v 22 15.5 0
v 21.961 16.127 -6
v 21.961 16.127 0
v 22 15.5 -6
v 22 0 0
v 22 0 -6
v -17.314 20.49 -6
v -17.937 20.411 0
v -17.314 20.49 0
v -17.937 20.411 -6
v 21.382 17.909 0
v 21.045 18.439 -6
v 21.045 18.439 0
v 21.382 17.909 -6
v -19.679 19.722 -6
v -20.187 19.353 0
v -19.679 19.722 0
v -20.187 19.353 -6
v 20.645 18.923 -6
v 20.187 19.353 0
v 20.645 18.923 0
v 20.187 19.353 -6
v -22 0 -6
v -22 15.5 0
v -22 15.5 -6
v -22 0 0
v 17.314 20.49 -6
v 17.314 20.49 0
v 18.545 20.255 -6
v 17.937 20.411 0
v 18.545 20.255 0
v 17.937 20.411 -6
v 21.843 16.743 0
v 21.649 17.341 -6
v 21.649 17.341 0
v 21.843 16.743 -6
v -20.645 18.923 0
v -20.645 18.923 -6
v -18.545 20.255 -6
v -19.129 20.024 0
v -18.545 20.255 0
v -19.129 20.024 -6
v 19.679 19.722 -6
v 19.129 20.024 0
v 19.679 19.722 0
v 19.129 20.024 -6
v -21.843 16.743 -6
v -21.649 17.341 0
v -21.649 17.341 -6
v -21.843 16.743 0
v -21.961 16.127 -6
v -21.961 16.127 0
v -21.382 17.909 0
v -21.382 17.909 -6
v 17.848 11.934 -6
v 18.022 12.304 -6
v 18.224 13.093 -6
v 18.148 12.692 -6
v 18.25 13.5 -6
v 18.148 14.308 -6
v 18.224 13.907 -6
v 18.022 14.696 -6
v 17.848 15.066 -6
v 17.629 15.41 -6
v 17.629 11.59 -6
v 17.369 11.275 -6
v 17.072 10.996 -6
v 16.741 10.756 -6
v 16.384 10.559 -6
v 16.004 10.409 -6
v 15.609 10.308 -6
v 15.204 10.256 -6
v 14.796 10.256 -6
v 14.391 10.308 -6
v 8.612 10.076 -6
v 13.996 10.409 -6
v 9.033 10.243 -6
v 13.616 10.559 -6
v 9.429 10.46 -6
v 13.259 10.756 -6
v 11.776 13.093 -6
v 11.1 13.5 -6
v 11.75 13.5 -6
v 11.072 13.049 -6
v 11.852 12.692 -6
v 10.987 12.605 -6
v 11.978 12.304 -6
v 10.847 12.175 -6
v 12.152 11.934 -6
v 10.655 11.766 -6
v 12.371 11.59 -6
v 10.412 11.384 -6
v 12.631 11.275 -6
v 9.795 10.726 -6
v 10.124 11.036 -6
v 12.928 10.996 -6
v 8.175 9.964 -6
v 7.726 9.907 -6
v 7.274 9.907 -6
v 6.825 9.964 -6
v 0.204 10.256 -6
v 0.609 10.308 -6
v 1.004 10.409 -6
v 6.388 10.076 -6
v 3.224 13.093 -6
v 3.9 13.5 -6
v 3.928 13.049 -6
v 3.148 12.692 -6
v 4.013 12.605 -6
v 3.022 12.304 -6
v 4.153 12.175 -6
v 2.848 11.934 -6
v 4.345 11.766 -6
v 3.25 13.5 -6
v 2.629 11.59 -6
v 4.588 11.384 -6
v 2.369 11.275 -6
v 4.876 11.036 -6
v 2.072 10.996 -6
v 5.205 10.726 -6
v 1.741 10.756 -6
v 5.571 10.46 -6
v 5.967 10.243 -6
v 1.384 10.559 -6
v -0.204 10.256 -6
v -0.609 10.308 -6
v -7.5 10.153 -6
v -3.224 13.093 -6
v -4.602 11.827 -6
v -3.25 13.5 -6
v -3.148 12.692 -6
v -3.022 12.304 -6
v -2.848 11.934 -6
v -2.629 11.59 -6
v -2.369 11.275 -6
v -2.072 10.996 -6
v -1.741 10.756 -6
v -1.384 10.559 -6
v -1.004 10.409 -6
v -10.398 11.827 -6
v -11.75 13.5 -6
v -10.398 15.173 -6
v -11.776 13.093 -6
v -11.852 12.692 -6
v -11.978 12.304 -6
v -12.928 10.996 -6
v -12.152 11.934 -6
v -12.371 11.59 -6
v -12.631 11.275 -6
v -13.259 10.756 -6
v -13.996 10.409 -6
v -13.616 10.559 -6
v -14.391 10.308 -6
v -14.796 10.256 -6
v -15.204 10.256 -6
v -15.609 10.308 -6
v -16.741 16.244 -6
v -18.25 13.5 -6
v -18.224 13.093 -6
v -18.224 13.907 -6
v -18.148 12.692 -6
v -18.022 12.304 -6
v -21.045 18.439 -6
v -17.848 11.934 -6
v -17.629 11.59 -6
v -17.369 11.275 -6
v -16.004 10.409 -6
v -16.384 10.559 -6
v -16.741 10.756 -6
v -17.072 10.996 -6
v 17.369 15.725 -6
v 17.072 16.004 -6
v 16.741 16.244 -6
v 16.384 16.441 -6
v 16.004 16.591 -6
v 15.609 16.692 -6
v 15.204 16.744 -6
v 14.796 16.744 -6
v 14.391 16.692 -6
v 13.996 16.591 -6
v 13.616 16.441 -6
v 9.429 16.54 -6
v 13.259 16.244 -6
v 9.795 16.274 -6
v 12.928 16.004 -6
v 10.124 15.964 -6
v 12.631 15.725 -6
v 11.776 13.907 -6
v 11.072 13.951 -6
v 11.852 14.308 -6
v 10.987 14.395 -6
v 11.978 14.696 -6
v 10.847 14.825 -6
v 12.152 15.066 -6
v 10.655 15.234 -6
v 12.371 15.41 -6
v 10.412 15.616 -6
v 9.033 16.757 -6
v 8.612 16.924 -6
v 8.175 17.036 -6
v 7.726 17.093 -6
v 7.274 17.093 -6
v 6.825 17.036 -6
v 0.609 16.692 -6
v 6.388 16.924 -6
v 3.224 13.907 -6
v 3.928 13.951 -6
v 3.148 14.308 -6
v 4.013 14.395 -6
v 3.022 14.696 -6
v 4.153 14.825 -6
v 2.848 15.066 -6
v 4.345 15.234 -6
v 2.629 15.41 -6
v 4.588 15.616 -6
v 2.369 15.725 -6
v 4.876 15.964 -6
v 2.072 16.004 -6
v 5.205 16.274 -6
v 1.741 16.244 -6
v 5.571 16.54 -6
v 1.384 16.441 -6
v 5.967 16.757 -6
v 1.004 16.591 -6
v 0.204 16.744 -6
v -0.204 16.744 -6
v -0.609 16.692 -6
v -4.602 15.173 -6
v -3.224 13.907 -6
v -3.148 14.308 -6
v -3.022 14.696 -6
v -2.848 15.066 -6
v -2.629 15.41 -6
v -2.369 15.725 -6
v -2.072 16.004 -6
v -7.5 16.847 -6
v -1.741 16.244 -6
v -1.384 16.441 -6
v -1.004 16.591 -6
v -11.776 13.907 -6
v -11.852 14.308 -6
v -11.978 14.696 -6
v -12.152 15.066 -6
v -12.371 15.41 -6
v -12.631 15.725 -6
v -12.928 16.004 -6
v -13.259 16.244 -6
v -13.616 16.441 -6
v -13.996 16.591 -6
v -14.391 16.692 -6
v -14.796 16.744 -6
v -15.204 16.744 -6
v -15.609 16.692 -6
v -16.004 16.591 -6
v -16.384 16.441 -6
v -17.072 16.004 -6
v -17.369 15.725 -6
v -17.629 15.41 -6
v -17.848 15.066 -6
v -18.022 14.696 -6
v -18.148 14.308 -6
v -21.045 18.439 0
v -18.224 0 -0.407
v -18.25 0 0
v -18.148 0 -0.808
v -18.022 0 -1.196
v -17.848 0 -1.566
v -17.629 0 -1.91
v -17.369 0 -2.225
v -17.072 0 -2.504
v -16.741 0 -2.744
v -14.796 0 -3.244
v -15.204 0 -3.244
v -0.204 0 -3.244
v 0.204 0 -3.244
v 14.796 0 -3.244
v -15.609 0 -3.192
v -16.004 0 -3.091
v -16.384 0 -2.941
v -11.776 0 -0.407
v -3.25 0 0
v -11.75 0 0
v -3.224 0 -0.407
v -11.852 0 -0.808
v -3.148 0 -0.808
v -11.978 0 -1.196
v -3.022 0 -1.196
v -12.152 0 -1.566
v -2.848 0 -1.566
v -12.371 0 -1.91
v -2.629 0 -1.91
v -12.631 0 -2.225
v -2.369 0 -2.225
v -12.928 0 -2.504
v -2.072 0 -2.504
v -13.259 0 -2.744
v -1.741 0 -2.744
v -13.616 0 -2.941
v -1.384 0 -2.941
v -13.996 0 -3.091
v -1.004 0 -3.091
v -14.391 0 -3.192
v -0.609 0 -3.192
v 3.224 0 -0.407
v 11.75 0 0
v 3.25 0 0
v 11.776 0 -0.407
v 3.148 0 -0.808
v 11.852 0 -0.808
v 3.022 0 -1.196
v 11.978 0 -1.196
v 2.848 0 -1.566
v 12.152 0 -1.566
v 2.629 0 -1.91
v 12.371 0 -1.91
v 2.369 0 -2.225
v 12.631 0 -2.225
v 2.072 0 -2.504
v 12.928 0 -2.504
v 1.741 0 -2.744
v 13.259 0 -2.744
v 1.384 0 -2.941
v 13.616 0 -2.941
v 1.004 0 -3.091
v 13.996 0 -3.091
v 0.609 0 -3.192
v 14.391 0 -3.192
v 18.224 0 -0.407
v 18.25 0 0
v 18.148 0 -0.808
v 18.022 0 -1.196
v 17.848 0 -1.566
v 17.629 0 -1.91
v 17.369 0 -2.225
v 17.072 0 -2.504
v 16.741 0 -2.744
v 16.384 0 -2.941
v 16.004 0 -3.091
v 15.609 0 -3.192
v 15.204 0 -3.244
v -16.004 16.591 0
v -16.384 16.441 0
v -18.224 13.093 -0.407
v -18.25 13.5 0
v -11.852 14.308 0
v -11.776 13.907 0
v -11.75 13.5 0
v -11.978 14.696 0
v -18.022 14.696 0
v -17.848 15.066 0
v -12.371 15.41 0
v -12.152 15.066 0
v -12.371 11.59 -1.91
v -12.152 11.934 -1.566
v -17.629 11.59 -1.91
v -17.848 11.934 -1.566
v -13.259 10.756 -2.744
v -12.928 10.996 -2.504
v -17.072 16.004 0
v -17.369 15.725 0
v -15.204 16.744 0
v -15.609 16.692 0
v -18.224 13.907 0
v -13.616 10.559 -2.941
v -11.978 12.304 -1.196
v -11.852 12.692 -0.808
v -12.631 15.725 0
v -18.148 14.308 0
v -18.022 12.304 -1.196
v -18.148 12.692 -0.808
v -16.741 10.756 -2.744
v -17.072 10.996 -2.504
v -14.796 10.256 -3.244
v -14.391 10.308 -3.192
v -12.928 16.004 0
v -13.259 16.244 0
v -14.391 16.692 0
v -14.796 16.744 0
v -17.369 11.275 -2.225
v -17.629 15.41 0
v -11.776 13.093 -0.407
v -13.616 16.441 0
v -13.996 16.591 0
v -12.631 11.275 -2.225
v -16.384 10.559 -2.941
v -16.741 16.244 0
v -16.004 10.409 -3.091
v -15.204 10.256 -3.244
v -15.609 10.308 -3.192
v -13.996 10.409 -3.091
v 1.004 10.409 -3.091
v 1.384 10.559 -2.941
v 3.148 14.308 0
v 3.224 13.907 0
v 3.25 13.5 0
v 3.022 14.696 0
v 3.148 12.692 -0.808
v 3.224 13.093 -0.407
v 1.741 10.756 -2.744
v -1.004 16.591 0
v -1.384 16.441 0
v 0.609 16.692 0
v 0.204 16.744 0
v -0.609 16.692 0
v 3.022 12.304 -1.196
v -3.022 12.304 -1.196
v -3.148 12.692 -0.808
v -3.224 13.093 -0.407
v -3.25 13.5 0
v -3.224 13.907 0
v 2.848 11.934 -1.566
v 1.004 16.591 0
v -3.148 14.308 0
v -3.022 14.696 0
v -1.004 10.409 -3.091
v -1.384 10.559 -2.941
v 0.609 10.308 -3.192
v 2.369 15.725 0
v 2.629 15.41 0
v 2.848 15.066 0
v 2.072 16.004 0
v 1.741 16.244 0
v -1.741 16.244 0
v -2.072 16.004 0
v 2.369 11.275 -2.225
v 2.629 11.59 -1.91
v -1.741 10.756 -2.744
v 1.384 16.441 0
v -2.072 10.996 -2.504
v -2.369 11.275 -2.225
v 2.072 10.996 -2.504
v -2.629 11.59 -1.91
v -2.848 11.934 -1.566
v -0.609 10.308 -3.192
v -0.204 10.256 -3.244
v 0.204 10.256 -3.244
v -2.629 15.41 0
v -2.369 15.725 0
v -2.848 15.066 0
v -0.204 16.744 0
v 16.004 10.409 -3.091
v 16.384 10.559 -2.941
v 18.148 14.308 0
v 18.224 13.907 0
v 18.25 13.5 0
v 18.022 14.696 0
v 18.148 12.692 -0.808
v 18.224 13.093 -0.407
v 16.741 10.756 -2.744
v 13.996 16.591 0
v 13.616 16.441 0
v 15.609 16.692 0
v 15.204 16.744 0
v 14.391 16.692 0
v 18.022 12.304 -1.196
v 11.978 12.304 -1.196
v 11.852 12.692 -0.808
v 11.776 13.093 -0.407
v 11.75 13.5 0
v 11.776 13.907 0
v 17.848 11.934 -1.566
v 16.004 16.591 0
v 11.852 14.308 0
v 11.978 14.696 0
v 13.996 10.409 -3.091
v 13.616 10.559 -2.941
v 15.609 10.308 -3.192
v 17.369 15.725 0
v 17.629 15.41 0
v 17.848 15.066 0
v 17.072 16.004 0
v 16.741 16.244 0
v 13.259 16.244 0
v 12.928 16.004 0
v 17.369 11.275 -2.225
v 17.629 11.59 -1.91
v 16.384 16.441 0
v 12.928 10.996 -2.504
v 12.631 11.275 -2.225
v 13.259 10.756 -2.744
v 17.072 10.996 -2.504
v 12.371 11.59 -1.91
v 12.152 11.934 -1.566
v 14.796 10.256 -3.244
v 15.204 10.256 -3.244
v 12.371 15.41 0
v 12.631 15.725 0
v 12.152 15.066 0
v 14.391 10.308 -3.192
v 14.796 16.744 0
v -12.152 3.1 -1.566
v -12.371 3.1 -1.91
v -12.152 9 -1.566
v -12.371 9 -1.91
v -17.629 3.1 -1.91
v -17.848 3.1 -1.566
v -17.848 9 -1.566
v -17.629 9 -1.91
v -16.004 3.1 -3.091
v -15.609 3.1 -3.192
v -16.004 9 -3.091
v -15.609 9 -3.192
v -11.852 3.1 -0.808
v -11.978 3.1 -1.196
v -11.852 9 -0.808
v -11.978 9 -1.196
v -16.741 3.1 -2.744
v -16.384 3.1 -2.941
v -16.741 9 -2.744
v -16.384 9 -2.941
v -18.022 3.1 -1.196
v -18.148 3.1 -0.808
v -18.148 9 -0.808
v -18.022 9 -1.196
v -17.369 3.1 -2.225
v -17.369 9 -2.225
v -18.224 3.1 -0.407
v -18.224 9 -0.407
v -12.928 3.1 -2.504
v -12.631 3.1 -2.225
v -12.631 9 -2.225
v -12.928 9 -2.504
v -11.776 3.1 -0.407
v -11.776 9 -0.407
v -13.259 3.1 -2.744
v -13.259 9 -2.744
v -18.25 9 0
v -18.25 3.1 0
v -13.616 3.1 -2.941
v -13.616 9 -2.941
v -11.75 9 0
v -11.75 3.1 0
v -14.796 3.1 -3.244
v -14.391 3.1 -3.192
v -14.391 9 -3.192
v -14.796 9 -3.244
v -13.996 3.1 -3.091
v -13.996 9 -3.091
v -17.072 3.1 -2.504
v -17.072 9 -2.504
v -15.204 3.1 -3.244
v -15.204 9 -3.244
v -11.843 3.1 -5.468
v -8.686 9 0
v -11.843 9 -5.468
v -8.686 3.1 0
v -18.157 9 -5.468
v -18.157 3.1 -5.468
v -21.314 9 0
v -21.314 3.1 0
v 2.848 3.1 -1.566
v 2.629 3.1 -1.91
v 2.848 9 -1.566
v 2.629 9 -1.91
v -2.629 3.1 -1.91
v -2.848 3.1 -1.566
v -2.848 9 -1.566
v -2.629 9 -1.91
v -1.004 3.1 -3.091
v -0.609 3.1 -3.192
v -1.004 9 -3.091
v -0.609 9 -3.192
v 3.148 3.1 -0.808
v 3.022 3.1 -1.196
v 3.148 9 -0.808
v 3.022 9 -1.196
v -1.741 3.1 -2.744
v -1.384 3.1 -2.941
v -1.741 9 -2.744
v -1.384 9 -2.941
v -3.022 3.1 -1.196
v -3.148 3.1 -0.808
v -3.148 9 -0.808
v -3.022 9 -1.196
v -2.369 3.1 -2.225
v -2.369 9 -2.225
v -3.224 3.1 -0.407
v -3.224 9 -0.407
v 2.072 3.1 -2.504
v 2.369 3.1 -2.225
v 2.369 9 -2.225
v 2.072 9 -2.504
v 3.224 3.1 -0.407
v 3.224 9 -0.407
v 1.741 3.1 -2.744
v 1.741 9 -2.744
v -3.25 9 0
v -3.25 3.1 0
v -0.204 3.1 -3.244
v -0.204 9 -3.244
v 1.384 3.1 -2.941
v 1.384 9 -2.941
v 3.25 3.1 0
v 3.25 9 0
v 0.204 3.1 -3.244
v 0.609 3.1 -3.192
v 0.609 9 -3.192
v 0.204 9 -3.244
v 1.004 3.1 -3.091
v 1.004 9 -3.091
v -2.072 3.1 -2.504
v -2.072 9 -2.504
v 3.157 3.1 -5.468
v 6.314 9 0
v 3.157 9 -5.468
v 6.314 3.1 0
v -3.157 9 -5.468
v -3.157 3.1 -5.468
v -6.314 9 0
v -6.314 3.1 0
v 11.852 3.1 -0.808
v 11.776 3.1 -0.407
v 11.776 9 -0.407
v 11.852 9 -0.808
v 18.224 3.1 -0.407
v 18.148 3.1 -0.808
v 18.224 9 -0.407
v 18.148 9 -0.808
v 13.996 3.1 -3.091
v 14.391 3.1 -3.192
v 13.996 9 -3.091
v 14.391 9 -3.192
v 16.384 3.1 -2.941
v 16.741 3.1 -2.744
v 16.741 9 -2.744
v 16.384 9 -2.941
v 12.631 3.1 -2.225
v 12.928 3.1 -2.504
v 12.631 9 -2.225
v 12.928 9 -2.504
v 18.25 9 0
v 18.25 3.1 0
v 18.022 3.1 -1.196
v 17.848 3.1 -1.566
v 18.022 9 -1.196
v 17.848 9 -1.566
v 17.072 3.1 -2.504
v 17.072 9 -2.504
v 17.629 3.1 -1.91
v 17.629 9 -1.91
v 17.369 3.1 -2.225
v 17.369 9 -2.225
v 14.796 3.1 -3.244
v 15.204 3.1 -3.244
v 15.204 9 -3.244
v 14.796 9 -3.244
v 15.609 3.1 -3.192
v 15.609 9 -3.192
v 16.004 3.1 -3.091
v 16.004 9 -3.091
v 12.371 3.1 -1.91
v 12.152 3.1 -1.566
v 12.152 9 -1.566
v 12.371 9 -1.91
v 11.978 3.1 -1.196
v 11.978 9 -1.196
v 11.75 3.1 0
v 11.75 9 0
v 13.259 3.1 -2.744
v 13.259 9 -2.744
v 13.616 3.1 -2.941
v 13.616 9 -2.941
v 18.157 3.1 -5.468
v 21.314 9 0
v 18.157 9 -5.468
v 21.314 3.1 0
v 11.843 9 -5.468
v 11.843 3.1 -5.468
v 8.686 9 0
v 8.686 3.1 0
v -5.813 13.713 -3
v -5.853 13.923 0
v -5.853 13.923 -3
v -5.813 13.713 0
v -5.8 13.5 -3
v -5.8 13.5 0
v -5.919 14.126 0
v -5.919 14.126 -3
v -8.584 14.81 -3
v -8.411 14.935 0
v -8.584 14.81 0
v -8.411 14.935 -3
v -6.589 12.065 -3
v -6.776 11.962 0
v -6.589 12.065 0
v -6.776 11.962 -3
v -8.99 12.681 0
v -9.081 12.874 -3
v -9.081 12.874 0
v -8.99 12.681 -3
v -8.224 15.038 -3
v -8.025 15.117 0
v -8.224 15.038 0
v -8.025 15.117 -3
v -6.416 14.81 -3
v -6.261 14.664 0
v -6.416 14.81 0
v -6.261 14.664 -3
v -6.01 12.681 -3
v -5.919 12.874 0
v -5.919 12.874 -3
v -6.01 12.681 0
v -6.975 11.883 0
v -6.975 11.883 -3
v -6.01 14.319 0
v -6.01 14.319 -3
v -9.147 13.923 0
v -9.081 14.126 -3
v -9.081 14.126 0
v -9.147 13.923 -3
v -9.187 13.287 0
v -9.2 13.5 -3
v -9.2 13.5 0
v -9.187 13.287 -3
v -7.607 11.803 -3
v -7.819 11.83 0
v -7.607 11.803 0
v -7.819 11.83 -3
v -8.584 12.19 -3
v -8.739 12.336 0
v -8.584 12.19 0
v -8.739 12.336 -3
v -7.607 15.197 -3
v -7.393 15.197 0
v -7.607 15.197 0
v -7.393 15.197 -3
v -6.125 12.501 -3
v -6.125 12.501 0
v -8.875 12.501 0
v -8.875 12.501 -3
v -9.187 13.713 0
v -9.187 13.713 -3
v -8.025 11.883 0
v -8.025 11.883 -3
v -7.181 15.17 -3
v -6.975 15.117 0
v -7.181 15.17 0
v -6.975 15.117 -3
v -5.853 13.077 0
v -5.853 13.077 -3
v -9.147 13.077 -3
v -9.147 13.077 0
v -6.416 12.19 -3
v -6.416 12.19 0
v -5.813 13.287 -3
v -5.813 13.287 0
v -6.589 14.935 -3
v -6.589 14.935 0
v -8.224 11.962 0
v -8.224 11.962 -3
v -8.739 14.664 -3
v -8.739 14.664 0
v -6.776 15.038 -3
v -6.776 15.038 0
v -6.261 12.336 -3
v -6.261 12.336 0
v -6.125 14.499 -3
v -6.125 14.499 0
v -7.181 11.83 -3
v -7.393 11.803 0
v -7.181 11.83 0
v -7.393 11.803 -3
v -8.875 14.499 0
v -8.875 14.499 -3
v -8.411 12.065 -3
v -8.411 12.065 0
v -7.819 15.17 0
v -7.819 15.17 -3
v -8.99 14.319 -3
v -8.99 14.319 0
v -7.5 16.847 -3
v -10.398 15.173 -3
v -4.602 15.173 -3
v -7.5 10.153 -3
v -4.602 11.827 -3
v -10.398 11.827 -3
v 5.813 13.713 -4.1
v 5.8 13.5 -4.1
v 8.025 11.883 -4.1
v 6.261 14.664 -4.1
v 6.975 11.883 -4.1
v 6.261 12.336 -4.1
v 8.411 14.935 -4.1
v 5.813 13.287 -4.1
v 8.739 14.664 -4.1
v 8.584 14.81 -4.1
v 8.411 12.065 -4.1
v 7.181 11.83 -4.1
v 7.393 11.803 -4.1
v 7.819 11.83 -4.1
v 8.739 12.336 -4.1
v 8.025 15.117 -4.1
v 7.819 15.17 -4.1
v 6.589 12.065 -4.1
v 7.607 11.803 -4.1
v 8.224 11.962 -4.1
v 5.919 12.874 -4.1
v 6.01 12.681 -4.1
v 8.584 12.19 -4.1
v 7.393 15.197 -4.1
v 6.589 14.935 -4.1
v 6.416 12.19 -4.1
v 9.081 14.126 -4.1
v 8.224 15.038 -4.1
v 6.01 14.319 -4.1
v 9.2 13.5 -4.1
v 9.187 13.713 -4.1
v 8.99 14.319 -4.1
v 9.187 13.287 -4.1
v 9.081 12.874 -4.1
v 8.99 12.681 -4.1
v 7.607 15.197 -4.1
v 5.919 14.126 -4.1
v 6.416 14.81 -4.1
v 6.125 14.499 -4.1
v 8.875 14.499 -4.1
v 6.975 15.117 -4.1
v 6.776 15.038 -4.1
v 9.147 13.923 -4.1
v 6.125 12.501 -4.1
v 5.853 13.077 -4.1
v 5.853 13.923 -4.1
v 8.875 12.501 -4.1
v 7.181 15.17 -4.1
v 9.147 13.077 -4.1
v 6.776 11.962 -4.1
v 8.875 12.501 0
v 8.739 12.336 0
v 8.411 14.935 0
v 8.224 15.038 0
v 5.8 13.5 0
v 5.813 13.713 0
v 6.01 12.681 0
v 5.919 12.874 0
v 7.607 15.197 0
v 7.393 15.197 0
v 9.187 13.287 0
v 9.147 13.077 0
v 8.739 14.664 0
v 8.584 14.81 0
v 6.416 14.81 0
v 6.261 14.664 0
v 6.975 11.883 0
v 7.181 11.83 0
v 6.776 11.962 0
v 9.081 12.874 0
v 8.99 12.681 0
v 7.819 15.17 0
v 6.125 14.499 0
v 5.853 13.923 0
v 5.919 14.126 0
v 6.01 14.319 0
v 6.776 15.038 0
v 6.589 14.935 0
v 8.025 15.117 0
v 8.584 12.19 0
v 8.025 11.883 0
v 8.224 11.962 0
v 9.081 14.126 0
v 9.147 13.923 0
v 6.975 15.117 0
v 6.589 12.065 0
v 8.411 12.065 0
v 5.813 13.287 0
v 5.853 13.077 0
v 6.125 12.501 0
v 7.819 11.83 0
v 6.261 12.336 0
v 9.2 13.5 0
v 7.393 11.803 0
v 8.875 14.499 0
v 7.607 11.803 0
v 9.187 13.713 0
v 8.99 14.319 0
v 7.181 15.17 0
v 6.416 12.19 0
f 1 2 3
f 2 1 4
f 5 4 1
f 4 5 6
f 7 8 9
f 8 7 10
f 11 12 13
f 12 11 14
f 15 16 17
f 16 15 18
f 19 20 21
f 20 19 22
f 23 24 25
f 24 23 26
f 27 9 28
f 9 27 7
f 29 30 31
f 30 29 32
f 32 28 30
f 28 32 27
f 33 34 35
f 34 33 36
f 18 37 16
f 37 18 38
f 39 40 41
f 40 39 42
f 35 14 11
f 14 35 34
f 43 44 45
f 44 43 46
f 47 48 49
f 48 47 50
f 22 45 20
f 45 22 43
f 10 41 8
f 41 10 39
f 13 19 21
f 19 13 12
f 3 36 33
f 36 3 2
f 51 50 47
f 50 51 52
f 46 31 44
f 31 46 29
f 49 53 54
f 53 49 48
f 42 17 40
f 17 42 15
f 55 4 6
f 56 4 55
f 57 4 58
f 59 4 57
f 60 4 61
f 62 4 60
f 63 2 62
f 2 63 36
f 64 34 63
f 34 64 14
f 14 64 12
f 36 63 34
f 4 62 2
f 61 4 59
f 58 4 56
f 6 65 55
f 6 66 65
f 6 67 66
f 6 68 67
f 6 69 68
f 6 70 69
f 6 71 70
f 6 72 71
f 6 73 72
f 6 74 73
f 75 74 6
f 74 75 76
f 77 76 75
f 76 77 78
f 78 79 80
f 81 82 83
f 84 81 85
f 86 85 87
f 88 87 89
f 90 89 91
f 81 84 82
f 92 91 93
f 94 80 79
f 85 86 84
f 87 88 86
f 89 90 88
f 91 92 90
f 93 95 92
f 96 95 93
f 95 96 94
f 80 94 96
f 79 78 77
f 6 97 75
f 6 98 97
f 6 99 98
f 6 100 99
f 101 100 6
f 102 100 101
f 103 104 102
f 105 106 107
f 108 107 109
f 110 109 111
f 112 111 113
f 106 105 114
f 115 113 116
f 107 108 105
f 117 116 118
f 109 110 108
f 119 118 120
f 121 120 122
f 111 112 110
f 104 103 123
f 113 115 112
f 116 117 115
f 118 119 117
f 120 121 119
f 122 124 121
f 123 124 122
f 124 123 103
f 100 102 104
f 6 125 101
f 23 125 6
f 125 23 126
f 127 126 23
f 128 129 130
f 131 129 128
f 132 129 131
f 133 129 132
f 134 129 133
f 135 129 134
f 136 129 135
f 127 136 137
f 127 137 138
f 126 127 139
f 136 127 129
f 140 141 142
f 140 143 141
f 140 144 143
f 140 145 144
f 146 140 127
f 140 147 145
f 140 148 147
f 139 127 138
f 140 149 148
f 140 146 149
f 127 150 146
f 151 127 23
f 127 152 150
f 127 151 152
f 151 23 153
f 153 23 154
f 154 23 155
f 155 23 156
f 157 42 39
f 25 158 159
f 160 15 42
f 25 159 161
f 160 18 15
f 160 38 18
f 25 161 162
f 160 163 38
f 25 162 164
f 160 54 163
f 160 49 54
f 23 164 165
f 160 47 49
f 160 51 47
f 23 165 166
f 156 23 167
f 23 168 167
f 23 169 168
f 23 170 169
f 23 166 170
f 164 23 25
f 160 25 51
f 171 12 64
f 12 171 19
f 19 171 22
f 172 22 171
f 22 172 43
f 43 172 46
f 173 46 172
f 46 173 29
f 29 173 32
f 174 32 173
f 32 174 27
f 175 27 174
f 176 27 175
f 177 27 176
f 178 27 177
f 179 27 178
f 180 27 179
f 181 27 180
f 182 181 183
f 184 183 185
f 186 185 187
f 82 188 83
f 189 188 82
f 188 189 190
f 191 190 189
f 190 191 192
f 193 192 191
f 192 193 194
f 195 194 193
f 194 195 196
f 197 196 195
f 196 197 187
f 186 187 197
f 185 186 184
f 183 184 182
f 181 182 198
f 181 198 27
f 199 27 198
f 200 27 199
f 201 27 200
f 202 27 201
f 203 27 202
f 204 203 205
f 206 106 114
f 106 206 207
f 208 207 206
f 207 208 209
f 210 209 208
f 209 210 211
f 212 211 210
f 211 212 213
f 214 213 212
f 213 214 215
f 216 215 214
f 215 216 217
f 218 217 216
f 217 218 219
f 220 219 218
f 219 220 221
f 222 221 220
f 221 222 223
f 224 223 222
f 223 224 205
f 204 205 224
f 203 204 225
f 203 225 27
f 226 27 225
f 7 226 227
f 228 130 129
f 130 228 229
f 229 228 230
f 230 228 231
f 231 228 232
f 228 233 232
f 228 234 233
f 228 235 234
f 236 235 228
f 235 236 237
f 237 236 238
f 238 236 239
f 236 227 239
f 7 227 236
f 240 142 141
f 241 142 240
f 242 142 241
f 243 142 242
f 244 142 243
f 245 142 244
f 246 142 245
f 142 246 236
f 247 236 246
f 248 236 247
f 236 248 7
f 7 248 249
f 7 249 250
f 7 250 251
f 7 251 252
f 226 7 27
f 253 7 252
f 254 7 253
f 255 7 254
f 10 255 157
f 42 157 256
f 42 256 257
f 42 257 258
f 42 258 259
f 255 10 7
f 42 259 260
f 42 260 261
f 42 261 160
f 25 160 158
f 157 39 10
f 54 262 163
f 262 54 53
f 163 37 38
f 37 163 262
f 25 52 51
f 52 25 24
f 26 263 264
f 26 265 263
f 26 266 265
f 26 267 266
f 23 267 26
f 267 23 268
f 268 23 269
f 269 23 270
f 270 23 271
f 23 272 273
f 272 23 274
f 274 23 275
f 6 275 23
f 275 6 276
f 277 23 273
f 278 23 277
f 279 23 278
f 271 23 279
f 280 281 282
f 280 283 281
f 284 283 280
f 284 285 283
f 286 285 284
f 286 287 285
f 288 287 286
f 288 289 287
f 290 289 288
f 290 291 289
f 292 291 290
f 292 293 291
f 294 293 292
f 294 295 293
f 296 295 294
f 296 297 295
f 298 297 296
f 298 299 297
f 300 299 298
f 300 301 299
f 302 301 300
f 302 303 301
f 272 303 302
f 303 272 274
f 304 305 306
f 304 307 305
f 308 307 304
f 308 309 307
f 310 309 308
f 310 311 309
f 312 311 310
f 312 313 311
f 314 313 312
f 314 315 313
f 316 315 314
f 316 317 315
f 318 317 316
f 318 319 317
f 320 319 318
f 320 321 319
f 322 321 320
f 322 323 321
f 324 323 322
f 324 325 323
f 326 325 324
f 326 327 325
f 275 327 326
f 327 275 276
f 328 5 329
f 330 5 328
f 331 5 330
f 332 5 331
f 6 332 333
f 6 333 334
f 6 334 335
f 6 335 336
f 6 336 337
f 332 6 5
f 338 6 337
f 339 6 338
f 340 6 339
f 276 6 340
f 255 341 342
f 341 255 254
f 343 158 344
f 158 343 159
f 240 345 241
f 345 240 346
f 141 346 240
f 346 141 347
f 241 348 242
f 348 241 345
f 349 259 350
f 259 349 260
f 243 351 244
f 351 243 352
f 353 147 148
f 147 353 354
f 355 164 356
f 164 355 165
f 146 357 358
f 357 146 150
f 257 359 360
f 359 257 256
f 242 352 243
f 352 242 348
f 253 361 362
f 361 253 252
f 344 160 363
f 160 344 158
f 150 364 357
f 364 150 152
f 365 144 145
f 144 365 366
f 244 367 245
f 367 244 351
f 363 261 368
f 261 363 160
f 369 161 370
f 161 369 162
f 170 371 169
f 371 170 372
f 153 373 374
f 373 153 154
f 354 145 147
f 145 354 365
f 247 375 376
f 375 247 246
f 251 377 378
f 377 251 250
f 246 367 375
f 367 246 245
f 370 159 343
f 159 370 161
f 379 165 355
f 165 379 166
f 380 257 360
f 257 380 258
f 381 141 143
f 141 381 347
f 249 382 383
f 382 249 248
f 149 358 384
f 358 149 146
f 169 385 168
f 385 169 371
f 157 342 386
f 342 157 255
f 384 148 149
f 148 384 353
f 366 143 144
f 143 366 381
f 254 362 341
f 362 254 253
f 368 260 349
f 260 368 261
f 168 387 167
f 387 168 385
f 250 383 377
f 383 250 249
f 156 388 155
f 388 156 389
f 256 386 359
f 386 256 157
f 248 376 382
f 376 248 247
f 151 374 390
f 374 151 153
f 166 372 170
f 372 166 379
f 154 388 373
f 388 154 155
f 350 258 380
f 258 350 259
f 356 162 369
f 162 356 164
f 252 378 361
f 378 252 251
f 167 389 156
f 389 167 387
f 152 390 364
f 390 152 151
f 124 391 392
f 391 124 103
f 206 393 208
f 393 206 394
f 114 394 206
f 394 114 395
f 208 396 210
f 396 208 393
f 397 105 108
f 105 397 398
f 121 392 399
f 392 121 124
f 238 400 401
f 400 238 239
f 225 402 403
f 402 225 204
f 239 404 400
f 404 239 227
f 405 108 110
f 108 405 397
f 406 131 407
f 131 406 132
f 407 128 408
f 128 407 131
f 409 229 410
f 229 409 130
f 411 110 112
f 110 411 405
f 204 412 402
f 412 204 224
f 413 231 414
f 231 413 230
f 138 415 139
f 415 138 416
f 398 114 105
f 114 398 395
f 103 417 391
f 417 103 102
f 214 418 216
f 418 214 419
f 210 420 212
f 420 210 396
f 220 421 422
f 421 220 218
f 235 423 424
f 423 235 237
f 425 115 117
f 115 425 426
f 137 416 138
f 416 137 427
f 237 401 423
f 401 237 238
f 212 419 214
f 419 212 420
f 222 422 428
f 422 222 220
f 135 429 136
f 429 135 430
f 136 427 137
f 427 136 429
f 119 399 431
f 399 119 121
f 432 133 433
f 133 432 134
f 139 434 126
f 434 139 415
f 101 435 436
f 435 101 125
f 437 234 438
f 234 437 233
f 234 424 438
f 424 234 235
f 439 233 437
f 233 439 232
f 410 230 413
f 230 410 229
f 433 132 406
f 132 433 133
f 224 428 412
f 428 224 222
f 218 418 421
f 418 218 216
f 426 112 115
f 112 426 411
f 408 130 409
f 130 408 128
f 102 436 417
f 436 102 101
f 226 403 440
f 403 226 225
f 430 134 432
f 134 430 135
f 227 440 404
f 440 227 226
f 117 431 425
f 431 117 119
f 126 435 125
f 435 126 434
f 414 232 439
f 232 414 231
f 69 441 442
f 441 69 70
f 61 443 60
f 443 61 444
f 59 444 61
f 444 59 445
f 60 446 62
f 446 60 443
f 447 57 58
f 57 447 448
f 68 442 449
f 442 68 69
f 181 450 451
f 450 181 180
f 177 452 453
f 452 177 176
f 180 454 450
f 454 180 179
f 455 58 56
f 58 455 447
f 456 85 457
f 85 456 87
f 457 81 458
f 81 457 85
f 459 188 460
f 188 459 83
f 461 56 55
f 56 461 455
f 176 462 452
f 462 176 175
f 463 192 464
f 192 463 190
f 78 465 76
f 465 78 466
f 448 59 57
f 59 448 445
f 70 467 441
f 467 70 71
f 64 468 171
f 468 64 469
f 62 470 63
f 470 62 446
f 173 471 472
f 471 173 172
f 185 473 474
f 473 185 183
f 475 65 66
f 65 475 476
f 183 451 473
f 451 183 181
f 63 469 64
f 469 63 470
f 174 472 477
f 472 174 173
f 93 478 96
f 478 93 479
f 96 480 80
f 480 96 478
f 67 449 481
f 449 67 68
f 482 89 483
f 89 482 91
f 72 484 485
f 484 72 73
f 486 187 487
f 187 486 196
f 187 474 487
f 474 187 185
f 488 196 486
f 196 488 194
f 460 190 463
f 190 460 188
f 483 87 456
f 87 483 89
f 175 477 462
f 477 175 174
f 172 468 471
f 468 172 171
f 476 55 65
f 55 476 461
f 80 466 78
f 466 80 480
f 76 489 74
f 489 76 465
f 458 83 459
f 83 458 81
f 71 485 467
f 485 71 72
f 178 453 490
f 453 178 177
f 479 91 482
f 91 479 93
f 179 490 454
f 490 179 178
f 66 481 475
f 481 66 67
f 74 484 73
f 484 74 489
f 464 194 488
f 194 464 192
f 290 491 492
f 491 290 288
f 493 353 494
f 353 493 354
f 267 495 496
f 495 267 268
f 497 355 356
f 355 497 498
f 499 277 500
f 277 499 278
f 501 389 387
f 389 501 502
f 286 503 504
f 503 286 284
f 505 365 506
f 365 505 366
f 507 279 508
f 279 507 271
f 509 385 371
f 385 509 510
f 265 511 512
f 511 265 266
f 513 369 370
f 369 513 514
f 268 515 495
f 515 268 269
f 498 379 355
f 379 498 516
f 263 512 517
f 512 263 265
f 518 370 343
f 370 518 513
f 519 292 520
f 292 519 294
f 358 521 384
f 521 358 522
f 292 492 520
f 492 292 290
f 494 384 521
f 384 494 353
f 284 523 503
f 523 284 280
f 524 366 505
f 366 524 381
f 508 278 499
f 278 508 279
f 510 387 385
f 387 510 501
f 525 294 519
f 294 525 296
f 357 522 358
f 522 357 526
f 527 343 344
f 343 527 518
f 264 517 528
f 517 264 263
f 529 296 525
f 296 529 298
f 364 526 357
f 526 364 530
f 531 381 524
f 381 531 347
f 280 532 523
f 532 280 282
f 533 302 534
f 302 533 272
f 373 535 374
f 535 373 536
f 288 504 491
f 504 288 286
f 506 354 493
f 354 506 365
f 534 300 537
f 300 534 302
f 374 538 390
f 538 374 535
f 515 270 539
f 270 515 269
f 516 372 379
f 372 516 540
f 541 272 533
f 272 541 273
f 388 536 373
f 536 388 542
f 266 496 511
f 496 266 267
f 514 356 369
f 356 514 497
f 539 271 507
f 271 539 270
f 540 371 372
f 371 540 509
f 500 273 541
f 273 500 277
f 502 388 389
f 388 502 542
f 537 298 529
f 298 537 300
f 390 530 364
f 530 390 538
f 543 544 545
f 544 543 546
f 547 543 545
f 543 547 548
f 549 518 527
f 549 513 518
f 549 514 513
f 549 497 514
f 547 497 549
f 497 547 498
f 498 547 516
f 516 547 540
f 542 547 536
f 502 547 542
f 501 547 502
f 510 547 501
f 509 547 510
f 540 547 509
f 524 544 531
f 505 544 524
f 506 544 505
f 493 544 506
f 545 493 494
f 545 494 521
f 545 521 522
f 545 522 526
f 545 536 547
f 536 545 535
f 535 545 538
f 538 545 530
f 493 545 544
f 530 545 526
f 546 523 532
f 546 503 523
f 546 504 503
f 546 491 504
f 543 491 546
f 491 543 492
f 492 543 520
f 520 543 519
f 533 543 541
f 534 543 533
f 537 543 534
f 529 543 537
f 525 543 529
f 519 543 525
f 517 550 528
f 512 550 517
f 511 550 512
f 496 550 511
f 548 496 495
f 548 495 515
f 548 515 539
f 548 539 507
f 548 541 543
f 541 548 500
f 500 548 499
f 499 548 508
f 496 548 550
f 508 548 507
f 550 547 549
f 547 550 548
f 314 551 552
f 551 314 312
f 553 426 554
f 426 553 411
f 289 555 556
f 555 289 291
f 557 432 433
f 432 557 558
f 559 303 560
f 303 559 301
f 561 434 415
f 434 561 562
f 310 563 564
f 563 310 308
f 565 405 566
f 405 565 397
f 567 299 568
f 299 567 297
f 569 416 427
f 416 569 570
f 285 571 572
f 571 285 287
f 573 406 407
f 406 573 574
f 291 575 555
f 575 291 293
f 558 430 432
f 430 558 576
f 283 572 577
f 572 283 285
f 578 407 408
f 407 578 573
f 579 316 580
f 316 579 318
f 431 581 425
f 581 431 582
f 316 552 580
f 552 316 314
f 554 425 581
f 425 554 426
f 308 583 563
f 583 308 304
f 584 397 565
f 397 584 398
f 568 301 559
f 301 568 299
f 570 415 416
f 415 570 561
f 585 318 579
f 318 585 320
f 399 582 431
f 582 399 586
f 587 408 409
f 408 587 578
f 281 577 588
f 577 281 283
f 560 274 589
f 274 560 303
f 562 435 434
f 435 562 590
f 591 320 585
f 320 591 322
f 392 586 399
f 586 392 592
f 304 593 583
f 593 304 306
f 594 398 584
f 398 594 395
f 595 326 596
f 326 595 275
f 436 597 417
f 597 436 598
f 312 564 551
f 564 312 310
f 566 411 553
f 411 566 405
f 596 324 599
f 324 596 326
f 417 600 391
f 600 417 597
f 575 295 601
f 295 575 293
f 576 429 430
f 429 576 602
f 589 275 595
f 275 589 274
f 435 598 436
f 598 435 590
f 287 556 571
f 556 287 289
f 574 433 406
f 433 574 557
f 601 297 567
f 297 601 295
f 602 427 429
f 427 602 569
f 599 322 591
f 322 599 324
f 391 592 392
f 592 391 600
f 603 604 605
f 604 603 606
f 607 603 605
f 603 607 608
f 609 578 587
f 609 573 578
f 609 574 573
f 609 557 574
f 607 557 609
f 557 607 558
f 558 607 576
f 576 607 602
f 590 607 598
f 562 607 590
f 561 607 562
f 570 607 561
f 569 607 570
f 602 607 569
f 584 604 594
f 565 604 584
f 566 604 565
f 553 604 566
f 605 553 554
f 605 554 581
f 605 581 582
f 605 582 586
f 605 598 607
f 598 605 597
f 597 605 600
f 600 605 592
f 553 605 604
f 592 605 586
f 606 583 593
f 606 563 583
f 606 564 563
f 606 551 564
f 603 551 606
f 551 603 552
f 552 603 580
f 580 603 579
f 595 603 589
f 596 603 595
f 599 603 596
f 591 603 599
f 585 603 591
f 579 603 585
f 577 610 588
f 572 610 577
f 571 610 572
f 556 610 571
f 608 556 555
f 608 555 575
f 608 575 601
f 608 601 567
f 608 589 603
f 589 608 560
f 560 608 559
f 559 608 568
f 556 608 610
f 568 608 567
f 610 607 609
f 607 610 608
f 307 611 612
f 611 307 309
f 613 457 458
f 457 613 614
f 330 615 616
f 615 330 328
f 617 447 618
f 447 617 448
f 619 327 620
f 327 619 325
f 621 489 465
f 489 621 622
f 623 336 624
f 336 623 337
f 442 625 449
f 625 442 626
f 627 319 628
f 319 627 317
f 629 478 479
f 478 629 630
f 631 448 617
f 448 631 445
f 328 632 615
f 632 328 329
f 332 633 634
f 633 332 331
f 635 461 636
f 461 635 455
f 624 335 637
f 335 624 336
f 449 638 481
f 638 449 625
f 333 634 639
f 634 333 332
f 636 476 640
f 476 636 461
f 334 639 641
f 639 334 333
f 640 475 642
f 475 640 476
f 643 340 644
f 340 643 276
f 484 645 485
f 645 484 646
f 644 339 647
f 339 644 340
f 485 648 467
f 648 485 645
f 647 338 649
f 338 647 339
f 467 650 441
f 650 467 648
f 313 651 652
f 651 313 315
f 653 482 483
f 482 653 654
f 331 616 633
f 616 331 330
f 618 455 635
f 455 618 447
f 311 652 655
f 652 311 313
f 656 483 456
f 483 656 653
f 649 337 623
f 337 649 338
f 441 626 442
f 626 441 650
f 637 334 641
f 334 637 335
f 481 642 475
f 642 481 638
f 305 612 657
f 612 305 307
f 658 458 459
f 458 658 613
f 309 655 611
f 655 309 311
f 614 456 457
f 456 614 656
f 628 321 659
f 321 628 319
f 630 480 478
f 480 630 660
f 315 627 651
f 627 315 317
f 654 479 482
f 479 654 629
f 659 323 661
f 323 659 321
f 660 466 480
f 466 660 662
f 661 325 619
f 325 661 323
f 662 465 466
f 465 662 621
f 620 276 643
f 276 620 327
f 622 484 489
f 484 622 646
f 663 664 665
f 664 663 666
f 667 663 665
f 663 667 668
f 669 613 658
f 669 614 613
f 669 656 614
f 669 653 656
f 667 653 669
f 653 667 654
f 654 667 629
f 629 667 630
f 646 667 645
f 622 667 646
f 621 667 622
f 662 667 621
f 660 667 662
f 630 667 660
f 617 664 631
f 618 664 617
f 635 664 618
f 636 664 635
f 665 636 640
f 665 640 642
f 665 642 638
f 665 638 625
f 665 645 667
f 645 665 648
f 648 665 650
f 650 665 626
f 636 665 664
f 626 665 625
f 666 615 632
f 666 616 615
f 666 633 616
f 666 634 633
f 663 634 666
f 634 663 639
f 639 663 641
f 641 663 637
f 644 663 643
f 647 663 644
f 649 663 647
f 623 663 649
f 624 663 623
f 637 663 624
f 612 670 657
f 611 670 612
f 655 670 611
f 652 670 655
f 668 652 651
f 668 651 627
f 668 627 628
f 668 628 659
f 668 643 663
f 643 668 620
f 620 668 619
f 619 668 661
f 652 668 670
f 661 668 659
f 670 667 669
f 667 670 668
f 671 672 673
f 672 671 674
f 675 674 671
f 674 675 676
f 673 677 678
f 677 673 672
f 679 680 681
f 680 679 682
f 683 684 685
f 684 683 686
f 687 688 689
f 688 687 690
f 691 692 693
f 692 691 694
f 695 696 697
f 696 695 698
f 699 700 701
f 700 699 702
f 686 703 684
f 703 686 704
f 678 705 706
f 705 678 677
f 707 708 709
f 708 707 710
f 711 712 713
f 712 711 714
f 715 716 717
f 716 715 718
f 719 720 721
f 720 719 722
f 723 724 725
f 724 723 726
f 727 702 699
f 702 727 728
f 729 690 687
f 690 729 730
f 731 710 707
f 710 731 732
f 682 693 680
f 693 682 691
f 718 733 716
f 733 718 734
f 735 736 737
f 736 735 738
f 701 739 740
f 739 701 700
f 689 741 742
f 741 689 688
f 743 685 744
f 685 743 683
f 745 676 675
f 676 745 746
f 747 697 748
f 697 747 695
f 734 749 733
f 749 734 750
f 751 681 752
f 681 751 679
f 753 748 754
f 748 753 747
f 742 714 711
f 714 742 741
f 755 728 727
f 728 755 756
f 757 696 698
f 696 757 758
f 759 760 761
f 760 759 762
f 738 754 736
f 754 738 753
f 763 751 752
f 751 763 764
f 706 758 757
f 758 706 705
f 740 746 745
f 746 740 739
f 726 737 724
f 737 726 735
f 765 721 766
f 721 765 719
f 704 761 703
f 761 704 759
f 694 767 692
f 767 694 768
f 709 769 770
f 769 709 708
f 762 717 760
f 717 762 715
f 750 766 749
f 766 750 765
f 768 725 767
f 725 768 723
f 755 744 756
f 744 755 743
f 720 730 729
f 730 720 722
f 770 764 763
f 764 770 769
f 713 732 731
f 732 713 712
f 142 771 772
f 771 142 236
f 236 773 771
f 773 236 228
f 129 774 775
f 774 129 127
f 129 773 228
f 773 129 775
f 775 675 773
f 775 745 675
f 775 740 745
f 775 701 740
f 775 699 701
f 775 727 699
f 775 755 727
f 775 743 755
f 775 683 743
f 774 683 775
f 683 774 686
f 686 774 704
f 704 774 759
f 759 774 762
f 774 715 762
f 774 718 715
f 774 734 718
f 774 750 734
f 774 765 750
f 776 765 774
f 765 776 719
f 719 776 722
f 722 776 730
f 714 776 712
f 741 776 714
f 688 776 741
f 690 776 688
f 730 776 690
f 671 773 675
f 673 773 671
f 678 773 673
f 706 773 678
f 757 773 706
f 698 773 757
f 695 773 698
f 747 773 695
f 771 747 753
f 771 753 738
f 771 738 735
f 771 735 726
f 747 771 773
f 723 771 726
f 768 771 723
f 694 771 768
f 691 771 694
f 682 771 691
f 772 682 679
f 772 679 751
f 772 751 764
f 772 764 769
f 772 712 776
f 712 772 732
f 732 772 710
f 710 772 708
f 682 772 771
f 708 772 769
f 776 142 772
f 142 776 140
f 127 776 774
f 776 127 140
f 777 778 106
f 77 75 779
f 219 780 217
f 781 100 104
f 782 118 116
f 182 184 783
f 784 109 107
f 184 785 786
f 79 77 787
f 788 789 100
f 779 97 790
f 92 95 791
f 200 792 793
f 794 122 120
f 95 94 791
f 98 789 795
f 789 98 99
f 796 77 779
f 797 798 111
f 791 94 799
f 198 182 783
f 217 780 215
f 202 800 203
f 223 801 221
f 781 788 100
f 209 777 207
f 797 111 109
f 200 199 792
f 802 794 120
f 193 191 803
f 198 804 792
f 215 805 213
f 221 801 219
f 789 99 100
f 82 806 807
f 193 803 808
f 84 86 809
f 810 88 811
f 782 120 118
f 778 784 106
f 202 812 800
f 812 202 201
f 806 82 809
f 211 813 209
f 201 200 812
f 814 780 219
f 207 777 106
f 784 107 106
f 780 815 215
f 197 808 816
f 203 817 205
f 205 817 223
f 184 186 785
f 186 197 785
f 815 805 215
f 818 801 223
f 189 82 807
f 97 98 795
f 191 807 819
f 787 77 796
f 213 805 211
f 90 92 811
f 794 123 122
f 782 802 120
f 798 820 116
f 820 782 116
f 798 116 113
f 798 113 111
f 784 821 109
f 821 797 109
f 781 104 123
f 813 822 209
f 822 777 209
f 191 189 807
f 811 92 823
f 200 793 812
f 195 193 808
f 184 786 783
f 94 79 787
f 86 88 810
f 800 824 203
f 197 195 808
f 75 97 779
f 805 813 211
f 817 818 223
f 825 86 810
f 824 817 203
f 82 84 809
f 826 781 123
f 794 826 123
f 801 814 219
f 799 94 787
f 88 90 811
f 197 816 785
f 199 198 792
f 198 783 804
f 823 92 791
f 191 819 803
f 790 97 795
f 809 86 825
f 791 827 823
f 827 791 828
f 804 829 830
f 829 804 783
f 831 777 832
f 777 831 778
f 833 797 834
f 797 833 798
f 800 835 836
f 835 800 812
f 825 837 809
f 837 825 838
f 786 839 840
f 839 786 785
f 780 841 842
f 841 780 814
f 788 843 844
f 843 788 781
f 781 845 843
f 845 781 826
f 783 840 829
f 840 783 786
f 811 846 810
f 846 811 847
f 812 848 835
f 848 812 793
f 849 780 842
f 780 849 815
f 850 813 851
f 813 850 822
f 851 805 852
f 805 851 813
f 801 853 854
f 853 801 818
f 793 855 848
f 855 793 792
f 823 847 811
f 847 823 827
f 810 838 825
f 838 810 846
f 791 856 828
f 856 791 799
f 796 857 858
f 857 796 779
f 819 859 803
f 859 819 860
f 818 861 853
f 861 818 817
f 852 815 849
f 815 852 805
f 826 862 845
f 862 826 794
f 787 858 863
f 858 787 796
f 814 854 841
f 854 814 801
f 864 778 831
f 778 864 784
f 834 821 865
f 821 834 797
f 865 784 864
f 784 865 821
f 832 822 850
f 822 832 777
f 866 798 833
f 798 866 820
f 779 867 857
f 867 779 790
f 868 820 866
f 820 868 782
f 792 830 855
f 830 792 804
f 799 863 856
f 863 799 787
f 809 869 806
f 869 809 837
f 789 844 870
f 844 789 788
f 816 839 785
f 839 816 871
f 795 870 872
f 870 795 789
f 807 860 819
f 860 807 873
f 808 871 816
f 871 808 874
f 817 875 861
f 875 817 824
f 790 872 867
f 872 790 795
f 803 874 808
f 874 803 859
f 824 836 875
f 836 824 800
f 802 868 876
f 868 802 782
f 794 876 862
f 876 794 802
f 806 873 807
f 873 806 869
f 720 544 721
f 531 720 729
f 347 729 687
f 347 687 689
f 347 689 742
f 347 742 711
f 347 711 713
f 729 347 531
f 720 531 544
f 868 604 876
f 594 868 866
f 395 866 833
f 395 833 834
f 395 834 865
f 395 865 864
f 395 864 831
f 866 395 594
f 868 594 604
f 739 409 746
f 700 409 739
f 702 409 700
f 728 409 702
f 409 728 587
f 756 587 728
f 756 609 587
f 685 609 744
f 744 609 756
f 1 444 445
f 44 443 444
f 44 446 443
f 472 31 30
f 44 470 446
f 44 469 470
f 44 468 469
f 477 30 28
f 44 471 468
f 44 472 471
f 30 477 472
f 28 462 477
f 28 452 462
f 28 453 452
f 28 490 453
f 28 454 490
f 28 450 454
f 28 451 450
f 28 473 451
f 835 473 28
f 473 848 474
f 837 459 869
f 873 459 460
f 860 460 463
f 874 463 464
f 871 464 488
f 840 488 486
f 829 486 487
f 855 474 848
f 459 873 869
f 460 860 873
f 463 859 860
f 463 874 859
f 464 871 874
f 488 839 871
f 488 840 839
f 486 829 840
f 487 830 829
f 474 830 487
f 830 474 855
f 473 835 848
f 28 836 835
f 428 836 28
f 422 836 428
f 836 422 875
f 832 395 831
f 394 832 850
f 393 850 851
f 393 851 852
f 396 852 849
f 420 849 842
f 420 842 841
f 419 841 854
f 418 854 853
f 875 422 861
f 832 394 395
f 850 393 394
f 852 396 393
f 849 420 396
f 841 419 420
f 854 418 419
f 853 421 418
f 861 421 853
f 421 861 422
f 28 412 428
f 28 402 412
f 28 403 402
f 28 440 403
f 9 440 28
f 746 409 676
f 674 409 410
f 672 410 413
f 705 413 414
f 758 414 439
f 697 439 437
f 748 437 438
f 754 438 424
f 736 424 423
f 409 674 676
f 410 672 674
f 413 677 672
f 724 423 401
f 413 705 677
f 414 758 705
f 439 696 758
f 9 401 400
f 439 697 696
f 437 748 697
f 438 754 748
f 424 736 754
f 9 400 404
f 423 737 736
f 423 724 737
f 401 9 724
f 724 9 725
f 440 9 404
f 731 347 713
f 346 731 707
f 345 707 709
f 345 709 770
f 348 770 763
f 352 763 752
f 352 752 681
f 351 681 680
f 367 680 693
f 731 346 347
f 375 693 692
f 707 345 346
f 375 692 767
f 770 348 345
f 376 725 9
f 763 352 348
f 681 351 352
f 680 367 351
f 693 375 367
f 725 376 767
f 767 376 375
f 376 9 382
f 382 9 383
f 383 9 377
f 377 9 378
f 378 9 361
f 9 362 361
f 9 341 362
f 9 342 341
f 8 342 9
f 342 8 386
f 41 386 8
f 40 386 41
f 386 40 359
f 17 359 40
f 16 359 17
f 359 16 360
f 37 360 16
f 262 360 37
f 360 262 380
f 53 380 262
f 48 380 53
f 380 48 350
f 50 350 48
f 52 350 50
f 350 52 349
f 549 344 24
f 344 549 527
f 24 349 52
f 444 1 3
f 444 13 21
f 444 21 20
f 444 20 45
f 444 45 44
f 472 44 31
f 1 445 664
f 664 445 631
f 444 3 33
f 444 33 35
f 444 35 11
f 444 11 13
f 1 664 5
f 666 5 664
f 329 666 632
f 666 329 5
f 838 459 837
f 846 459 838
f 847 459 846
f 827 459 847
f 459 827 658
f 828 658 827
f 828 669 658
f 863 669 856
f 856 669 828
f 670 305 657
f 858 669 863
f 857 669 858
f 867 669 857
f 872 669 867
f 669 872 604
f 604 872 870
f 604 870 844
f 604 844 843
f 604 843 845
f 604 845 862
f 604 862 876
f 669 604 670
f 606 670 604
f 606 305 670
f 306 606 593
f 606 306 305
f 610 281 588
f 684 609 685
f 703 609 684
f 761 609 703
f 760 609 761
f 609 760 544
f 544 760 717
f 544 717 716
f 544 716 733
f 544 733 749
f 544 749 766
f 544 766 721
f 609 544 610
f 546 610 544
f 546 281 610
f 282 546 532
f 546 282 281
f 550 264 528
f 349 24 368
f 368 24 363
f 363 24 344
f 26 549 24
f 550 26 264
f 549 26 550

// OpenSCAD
$fn = 50;


difference() {
	union() {
		translate(v = [0, 13.5000000000, -6.0000000000]) {
			rotate(a = [0, 0, 0]) {
				hull() {
					translate(v = [-17.0000000000, 2.0000000000, 0]) {
						rotate(a = [0, 0, 0]) {
							translate(v = [0, 0, 0]) {
								rotate(a = [0, 0, 0]) {
									cylinder(h = 12, r = 5);
								}
							}
						}
					}
					translate(v = [17.0000000000, 2.0000000000, 0]) {
						rotate(a = [0, 0, 0]) {
							translate(v = [0, 0, 0]) {
								rotate(a = [0, 0, 0]) {
									cylinder(h = 12, r = 5);
								}
							}
						}
					}
					translate(v = [-17.0000000000, -2.0000000000, 0]) {
						rotate(a = [0, 0, 0]) {
							translate(v = [0, 0, 0]) {
								rotate(a = [0, 0, 0]) {
									cylinder(h = 12, r = 5);
								}
							}
						}
					}
					translate(v = [17.0000000000, -2.0000000000, 0]) {
						rotate(a = [0, 0, 0]) {
							translate(v = [0, 0, 0]) {
								rotate(a = [0, 0, 0]) {
									cylinder(h = 12, r = 5);
								}
							}
						}
					}
				}
			}
		}
		translate(v = [-22.0000000000, 0, -6.0000000000]) {
			rotate(a = [0, 0, 0]) {
				cube(size = [44, 13.5000000000, 12]);
			}
		}
	}
	union() {
		translate(v = [-15.0000000000, 13.5000000000, -6.0000000000]) {
			rotate(a = [0, 0, 0]) {
				translate(v = [0, 0, -50]) {
					rotate(a = [0, 0, 0]) {
						cylinder(h = 100, r = 3.2500000000);
					}
				}
			}
		}
		translate(v = [0.0000000000, 13.5000000000, -6.0000000000]) {
			rotate(a = [0, 0, 0]) {
				translate(v = [0, 0, -50]) {
					rotate(a = [0, 0, 0]) {
						cylinder(h = 100, r = 3.2500000000);
					}
				}
			}
		}
		translate(v = [15.0000000000, 13.5000000000, -6.0000000000]) {
			rotate(a = [0, 0, 0]) {
				translate(v = [0, 0, -50]) {
					rotate(a = [0, 0, 0]) {
						cylinder(h = 100, r = 3.2500000000);
					}
				}
			}
		}
		translate(v = [-15.0000000000, 13.5000000000, 0]) {
			rotate(a = [90, 0, 0]) {
				cylinder(h = 13.5000000000, r = 3.2500000000);
			}
		}
		translate(v = [-15.0000000000, 9, 0]) {
			rotate(a = [90, 0, 0]) {
				#translate(v = [0, 0, 0]) {
					rotate(a = [0, 0, 0]) {
						linear_extrude(height = 5.9000000000) {
							polygon(points = [[6.3142500000, 0.0000000000], [3.1571250000, 5.4683009058], [-3.1571250000, 5.4683009058], [-6.3142500000, 0.0000000000], [-3.1571250000, -5.4683009058], [3.1571250000, -5.4683009058]]);
						}
					}
				}
			}
		}
		translate(v = [0.0000000000, 13.5000000000, 0]) {
			rotate(a = [90, 0, 0]) {
				cylinder(h = 13.5000000000, r = 3.2500000000);
			}
		}
		translate(v = [0.0000000000, 9, 0]) {
			rotate(a = [90, 0, 0]) {
				#translate(v = [0, 0, 0]) {
					rotate(a = [0, 0, 0]) {
						linear_extrude(height = 5.9000000000) {
							polygon(points = [[6.3142500000, 0.0000000000], [3.1571250000, 5.4683009058], [-3.1571250000, 5.4683009058], [-6.3142500000, 0.0000000000], [-3.1571250000, -5.4683009058], [3.1571250000, -5.4683009058]]);
						}
					}
				}
			}
		}
		translate(v = [15.0000000000, 13.5000000000, 0]) {
			rotate(a = [90, 0, 0]) {
				cylinder(h = 13.5000000000, r = 3.2500000000);
			}
		}
		translate(v = [15.0000000000, 9, 0]) {
			rotate(a = [90, 0, 0]) {
				#translate(v = [0, 0, 0]) {
					rotate(a = [0, 0, 0]) {
						linear_extrude(height = 5.9000000000) {
							polygon(points = [[6.3142500000, 0.0000000000], [3.1571250000, 5.4683009058], [-3.1571250000, 5.4683009058], [-6.3142500000, 0.0000000000], [-3.1571250000, -5.4683009058], [3.1571250000, -5.4683009058]]);
						}
					}
				}
			}
		}
		translate(v = [-7.5000000000, 13.5000000000, 4.1000000000]) {
			rotate(a = [0, 0, 0]) {
				cylinder(h = 1.9000000000, r1 = 1.7000000000, r2 = 3.6000000000);
			}
		}
		translate(v = [-7.5000000000, 13.5000000000, -6.0000000000]) {
			rotate(a = [0, 0, 0]) {
				cylinder(h = 12, r = 1.7000000000);
			}
		}
		translate(v = [-7.5000000000, 13.5000000000, -6.0000000000]) {
			rotate(a = [0, 0, 30.0000000000]) {
				translate(v = [0, 0, 0]) {
					rotate(a = [0, 0, 0]) {
						linear_extrude(height = 3) {
							polygon(points = [[3.3466000000, 0.0000000000], [1.6733000000, 2.8982406163], [-1.6733000000, 2.8982406163], [-3.3466000000, 0.0000000000], [-1.6733000000, -2.8982406163], [1.6733000000, -2.8982406163]]);
						}
					}
				}
			}
		}
		translate(v = [7.5000000000, 13.5000000000, -4.1000000000]) {
			rotate(a = [0, 180, 0]) {
				cylinder(h = 1.9000000000, r1 = 1.7000000000, r2 = 3.6000000000);
			}
		}
		translate(v = [7.5000000000, 13.5000000000, 6.0000000000]) {
			rotate(a = [0, 180, 0]) {
				cylinder(h = 12, r = 1.7000000000);
			}
		}
		translate(v = [7.5000000000, 13.5000000000, 6.0000000000]) {
			rotate(a = [0, 180, 30.0000000000]) {
				translate(v = [0, 0, 0]) {
					rotate(a = [0, 0, 0]) {
						linear_extrude(height = 3) {
							polygon(points = [[3.3466000000, 0.0000000000], [1.6733000000, 2.8982406163], [-1.6733000000, 2.8982406163], [-3.3466000000, 0.0000000000], [-1.6733000000, -2.8982406163], [1.6733000000, -2.8982406163]]);
						}
					}
				}
			}
		}
		translate(v = [-250.0000000000, -250.0000000000, 0]) {
			rotate(a = [0, 0, 0]) {
				cube(size = [500, 500, 500]);
			}
		}
	}
}
